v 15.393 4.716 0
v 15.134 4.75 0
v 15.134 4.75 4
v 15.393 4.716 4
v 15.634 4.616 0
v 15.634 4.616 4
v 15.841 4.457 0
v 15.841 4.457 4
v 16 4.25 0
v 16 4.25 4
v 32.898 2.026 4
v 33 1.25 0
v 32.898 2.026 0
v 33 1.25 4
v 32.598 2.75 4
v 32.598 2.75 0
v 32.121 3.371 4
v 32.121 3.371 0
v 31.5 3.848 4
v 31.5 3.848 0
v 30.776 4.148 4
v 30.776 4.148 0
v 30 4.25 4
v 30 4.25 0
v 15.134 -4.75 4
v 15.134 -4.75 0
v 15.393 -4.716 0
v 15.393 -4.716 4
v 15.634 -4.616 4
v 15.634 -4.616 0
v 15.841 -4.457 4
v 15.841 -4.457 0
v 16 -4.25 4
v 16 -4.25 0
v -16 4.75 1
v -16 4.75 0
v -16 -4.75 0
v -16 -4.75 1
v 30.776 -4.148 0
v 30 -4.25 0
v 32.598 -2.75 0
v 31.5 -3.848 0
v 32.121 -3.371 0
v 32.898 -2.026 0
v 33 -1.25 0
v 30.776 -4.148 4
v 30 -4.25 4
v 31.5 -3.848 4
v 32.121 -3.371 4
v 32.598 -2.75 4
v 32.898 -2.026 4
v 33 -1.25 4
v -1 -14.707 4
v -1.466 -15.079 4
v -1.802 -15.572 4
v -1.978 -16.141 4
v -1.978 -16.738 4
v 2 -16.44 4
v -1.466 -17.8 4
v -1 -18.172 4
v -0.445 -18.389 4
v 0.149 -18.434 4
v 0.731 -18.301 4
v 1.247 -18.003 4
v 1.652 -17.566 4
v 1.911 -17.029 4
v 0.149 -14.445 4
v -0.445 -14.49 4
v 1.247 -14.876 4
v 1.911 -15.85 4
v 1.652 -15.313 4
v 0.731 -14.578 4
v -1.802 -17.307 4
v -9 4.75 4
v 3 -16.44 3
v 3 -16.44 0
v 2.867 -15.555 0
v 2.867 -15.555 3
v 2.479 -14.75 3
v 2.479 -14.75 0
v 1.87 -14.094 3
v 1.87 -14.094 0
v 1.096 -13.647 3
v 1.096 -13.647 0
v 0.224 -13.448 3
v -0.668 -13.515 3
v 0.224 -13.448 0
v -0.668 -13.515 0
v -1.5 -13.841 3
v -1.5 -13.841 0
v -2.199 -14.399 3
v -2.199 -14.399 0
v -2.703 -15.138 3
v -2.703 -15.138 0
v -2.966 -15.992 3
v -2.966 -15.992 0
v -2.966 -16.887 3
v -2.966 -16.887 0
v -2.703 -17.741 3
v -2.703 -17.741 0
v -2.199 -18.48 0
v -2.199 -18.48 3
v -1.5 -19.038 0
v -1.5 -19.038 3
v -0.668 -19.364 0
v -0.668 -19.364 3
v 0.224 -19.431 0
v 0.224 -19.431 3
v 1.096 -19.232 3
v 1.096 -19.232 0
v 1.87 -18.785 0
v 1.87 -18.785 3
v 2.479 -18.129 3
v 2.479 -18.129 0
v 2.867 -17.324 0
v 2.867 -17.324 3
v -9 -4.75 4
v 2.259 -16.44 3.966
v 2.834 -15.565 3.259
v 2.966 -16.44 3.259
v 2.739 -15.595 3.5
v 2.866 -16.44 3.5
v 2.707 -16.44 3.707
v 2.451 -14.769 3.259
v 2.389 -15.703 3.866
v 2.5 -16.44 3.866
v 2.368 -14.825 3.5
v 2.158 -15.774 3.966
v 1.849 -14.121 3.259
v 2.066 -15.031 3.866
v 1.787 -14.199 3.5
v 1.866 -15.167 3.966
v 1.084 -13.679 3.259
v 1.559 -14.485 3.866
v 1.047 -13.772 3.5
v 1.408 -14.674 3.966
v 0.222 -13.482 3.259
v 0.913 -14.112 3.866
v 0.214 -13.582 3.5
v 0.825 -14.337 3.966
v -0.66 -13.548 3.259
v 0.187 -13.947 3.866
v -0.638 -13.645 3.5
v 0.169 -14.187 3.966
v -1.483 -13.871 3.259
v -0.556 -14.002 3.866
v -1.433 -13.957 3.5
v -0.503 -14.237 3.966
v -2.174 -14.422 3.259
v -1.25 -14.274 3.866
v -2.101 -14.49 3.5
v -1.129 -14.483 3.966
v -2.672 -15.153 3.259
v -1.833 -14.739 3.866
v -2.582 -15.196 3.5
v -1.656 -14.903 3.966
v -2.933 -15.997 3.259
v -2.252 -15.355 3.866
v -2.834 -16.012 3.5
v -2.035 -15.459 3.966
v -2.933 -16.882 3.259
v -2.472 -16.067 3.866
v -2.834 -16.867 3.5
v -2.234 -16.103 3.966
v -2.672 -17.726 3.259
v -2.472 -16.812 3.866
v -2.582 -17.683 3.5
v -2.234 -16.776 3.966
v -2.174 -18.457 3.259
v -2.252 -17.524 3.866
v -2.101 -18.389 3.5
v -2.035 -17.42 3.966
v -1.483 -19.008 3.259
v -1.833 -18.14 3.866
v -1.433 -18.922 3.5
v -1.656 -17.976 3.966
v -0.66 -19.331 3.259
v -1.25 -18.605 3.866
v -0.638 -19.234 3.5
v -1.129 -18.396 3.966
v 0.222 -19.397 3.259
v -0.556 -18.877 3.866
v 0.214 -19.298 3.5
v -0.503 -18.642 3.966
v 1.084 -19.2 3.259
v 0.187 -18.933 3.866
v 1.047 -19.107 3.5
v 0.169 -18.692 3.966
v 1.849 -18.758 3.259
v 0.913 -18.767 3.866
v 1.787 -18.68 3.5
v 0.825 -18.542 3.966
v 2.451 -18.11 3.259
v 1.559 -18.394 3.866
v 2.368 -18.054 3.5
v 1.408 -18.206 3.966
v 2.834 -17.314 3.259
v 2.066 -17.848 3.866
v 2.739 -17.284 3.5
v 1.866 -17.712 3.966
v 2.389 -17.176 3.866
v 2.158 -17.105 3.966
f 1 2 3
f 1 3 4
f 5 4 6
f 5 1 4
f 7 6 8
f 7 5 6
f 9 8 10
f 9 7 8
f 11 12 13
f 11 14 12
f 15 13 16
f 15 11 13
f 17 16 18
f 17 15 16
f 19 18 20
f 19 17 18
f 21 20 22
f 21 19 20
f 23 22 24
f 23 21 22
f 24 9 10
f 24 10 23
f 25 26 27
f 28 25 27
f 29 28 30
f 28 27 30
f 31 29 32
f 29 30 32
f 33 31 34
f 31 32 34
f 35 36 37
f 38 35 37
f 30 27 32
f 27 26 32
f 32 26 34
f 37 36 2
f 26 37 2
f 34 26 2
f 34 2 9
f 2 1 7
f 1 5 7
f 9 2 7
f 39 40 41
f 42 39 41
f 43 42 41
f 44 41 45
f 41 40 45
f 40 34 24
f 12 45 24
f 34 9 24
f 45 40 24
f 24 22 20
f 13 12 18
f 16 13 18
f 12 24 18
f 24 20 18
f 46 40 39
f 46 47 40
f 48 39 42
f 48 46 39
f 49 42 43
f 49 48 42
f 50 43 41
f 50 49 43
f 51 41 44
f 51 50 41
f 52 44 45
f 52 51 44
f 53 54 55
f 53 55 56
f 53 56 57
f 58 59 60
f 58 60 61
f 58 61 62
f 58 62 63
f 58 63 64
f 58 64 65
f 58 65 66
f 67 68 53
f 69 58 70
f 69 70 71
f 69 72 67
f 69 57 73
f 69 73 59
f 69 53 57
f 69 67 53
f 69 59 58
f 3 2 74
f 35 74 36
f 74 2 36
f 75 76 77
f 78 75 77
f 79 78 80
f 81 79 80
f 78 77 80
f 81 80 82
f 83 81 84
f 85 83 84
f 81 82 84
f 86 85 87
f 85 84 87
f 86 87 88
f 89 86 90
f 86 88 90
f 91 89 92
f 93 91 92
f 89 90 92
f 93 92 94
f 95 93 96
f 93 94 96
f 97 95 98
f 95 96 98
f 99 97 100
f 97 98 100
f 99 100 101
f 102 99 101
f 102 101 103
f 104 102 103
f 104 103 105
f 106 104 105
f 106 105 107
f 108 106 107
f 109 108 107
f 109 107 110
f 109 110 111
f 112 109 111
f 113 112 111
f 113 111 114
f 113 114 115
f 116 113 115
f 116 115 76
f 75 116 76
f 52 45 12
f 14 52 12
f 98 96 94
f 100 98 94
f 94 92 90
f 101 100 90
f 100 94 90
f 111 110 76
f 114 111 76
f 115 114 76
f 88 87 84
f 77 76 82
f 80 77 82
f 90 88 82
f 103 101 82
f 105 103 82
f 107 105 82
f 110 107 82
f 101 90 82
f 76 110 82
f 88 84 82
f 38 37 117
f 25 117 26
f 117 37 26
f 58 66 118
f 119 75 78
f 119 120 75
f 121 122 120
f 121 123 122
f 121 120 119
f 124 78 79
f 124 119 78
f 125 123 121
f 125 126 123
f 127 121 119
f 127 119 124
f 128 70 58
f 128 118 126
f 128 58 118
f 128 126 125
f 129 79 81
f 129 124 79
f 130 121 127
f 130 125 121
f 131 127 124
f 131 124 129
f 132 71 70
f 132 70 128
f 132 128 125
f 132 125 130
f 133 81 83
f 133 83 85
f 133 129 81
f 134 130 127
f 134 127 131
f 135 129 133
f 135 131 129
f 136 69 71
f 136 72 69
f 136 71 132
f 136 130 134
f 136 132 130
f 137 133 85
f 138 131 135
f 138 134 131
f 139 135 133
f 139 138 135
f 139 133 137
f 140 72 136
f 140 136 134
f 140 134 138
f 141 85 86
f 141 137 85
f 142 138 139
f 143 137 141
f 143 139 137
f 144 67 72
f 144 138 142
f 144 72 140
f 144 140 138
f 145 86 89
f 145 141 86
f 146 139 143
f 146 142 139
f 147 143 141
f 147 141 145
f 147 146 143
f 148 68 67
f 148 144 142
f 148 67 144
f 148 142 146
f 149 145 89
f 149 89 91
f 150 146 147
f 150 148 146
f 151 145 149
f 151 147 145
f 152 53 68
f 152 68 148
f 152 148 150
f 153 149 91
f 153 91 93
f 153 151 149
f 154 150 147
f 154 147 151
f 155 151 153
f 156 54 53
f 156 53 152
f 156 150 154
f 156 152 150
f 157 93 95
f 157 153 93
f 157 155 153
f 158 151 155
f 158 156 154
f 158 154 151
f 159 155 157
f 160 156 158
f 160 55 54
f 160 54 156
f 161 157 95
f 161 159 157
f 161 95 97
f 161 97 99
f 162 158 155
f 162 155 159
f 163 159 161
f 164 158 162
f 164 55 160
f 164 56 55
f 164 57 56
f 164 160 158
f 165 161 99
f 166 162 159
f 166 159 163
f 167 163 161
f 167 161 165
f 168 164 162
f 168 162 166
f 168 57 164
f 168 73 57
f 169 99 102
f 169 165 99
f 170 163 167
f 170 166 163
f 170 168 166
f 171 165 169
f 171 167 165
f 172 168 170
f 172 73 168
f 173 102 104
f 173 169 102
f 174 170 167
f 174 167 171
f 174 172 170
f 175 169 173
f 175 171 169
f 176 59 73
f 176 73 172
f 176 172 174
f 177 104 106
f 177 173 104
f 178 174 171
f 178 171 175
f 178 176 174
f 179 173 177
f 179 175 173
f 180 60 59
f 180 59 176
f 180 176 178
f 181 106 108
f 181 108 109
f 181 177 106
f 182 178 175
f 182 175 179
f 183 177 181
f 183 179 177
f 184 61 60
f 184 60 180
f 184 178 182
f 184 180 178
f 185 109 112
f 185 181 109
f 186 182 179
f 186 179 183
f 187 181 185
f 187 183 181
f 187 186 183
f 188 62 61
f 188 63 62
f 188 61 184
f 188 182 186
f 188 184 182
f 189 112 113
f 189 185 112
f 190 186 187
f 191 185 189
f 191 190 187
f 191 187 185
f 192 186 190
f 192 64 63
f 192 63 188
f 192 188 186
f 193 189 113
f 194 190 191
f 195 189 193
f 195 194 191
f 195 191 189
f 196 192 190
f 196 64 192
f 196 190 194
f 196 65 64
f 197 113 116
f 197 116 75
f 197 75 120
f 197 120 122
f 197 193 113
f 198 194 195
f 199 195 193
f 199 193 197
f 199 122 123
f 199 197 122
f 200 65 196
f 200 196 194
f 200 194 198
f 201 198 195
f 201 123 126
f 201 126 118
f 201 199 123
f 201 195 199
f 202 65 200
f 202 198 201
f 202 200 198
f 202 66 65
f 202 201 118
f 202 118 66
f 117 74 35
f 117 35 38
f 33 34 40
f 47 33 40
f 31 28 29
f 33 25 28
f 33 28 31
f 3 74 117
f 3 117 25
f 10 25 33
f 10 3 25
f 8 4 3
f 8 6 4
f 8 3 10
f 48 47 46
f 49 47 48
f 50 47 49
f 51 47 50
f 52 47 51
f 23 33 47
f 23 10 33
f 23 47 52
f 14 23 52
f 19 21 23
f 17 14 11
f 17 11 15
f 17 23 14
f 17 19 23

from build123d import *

# Parameters (mm, degrees)
F0_W        = 17
F0_H        = 8.5
F1_DEPTH    = 4
F0_R        = 3
F2_R        = 3
F3_SIZE2    = 7
F3_SIZE     = 3
F4_T1_DEPTH = 8.3301270189


# Not quite as in the source:
# - a fillet or chamfer that OpenCascade refuses, or shapes differently, is made with other operations: its cross-section is extruded or revolved along the edge and cut away or added


with BuildPart() as f1:
    # F0 (on Top) → F1 (new body)
    with BuildSketch(Plane.XY):
        Polygon((-16, -4.75), (16, -4.75), (16, -4.25), (16, 4.25), (16, 4.75), (-16, 4.75), align=None)
        with Locations((24.5, 0)):
            Rectangle(F0_W, F0_H)
    extrude(amount=F1_DEPTH)

    # F2
    f2_edges = [f1.edges().sort_by_distance(p)[0] for p in [
        (33, -4.25, 2),
        (33, 4.25, 2),
    ]]
    fillet(f2_edges, radius=F2_R)

    # F3
    f3_edges = [f1.edges().sort_by_distance(p)[0] for p in [
        (-16, 0, 4),
    ]]
    f3_side = f1.faces().sort_by_distance((-16, 0, 2))[0]
    chamfer(f3_edges, length=F3_SIZE, length2=F3_SIZE2, reference=f3_side)

    # F4: fillet of radius 1 on 2 edges, made by hand

    # F4_s2 → F4_t1 (cut)
    with BuildSketch(Plane.XY.offset(-2.1650635095)):
        with BuildLine():
            ThreePointArc((15.1339745962, -4.75), (15.6339745962, -4.6160254038), (16, -4.25))
            Line((16, -4.25), (16, -4.75))
            Line((16, -4.75), (15.1339745962, -4.75))
        make_face()
        with BuildLine():
            ThreePointArc((15.1339745962, 4.75), (15.6339745962, 4.6160254038), (16, 4.25))
            Line((16, 4.25), (16, 4.75))
            Line((16, 4.75), (15.1339745962, 4.75))
        make_face()
    extrude(amount=F4_T1_DEPTH, mode=Mode.SUBTRACT)


with BuildPart() as f1b:
    # F0 (on Top) → F1, piece 2 (new body)
    with BuildSketch(Plane.XY):
        with Locations((0, -16.4395216852)):
            Circle(F0_R)
    extrude(amount=F1_DEPTH)

    # F4#2: fillet of radius 1 on 1 edges, made by hand

    # F4_2_s1 → F4_2_t2 (revolve, cut)
    with BuildSketch(Plane.XZ.offset(16.4395216852)):
        with BuildLine():
            ThreePointArc((3, 3), (2.7071067812, 3.7071067812), (2, 4))
            Line((2, 4), (3, 4))
            Line((3, 4), (3, 3))
        make_face()
    revolve(axis=Axis((0, -16.4395216852, 4), (0, 0, 1)), mode=Mode.SUBTRACT)


solid = Compound([f1.part, f1b.part])
